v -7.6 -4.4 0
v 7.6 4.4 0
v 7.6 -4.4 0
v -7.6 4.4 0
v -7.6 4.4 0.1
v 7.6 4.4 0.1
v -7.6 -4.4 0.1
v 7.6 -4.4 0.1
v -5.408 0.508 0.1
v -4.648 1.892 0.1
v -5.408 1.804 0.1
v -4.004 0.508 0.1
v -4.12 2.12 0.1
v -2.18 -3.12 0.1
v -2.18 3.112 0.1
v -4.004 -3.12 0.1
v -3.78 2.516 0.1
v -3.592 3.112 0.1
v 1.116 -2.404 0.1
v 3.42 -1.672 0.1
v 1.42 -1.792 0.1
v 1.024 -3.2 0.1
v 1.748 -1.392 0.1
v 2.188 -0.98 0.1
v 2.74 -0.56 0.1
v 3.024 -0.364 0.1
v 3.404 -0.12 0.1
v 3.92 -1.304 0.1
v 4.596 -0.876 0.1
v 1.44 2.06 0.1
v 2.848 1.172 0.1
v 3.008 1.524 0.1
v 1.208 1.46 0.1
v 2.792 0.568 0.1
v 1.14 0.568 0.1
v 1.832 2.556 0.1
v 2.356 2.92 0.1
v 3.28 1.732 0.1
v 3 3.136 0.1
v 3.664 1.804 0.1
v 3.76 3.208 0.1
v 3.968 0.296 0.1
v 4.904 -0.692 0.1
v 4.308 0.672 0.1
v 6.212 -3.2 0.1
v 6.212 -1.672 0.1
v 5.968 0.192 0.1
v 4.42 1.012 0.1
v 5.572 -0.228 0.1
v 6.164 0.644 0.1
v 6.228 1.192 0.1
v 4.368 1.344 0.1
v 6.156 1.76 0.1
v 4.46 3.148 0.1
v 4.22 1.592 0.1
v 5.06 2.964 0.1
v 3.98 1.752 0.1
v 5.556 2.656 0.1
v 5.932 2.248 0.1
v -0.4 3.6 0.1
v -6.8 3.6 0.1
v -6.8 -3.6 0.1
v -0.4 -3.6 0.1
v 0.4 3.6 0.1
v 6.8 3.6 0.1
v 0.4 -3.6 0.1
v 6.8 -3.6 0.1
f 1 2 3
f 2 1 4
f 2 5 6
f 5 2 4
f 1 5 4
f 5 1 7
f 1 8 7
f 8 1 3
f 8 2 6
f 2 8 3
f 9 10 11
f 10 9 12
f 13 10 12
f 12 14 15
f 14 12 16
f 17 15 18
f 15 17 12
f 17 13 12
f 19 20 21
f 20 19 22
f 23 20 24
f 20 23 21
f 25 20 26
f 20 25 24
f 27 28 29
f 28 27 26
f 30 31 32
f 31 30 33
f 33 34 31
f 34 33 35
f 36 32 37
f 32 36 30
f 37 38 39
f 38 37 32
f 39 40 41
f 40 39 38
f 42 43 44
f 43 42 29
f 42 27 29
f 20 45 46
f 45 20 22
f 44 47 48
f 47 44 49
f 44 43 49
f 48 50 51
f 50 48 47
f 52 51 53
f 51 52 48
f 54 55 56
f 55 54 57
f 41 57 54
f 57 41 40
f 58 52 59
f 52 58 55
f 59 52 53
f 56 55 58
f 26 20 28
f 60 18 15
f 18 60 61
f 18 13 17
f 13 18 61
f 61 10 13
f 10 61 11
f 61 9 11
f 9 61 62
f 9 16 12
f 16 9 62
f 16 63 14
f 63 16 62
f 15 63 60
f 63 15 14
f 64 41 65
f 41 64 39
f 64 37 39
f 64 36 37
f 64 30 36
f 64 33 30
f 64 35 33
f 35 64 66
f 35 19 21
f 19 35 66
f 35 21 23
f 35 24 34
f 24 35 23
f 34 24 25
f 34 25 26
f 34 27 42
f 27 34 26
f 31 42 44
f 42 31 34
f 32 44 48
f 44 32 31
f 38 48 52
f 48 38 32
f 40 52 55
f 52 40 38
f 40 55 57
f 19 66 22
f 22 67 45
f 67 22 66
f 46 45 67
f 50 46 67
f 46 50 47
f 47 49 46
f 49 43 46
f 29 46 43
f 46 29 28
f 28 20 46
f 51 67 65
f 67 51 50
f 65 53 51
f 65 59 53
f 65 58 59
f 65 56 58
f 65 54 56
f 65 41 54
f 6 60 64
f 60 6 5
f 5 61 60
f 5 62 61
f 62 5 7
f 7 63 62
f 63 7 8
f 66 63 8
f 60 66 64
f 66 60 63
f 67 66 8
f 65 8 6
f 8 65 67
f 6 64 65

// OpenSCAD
// file: ../p/4-4edge.scad
use <../lib.scad>
$fa=1; $fs=0.2;
function ldraw_lib__4_4edge(realsolid=false) = [
// 0 Circle 1.0
// 0 Name: 4-4edge.dat
// 0 Author: James Jessiman
// 0 !LDRAW_ORG Primitive UPDATE 2017-01
// 0 !LICENSE Licensed under CC BY 2.0 and CC BY 4.0 : see CAreadme.txt
// 
// 0 BFC CERTIFY CCW
  [0,"BFC","CERTIFY"],
  [0,"BFC","CCW"],
// 
// 0 !HISTORY 1998-12-15 [PTadmin] Official Update 1998-10
// 0 !HISTORY 2005-12-28 [PTadmin] Official Update 2005-01
// 0 !HISTORY 2007-06-24 [PTadmin] Header formatted for Contributor Agreement
// 0 !HISTORY 2008-07-01 [PTadmin] Official Update 2008-01
// 0 !HISTORY 2017-01-15 [Steffen] BFCed
// 0 !HISTORY 2017-12-30 [PTadmin] Official Update 2017-01
// 
// 
// 2 24 1 0 0 0.9239 0 0.3827
  [2,24,1,0,0,0.9239,0,0.3827],
// 2 24 0.9239 0 0.3827 0.7071 0 0.7071
  [2,24,0.9239,0,0.3827,0.7071,0,0.7071],
// 2 24 0.7071 0 0.7071 0.3827 0 0.9239
  [2,24,0.7071,0,0.7071,0.3827,0,0.9239],
// 2 24 0.3827 0 0.9239 0 0 1
  [2,24,0.3827,0,0.9239,0,0,1],
// 2 24 0 0 1 -0.3827 0 0.9239
  [2,24,0,0,1,-0.3827,0,0.9239],
// 2 24 -0.3827 0 0.9239 -0.7071 0 0.7071
  [2,24,-0.3827,0,0.9239,-0.7071,0,0.7071],
// 2 24 -0.7071 0 0.7071 -0.9239 0 0.3827
  [2,24,-0.7071,0,0.7071,-0.9239,0,0.3827],
// 2 24 -0.9239 0 0.3827 -1 0 -0
  [2,24,-0.9239,0,0.3827,-1,0,-0],
// 2 24 -1 0 -0 -0.9239 0 -0.3827
  [2,24,-1,0,-0,-0.9239,0,-0.3827],
// 2 24 -0.9239 0 -0.3827 -0.7071 0 -0.7071
  [2,24,-0.9239,0,-0.3827,-0.7071,0,-0.7071],
// 2 24 -0.7071 0 -0.7071 -0.3827 0 -0.9239
  [2,24,-0.7071,0,-0.7071,-0.3827,0,-0.9239],
// 2 24 -0.3827 0 -0.9239 0 0 -1
  [2,24,-0.3827,0,-0.9239,0,0,-1],
// 2 24 0 0 -1 0.3827 0 -0.9239
  [2,24,0,0,-1,0.3827,0,-0.9239],
// 2 24 0.3827 0 -0.9239 0.7071 0 -0.7071
  [2,24,0.3827,0,-0.9239,0.7071,0,-0.7071],
// 2 24 0.7071 0 -0.7071 0.9239 0 -0.3827
  [2,24,0.7071,0,-0.7071,0.9239,0,-0.3827],
// 2 24 0.9239 0 -0.3827 1 0 0
  [2,24,0.9239,0,-0.3827,1,0,0],
];
module ldraw_lib__4_4edge(step=0, col=false, unit=2/5, alt=false, line=0.2, solid=!$preview)
    makepoly(ldraw_lib__4_4edge(solid), step=step, col=col, unit=unit, alt=alt, line=line, solid=solid);
ldraw_lib__4_4edge(line=0.2);
// file: ../p/4-4disc.scad
use <../lib.scad>
$fa=1; $fs=0.2;
function ldraw_lib__4_4disc(realsolid=false) = [
// 0 Disc 1.0
// 0 Name: 4-4disc.dat
// 0 Author: James Jessiman
// 0 !LDRAW_ORG Primitive UPDATE 2002-02
// 0 !LICENSE Licensed under CC BY 2.0 and CC BY 4.0 : see CAreadme.txt
// 
// 0 BFC CERTIFY CCW
  [0,"BFC","CERTIFY"],
  [0,"BFC","CCW"],
// 
// 0 !HISTORY 1998-12-15 [PTadmin] Official Update 1998-10
// 0 !HISTORY 2002-03-23 [sbliss] Added BFC statement
// 0 !HISTORY 2002-04-25 [PTadmin] Official Update 2002-02
// 0 !HISTORY 2007-06-24 [PTadmin] Header formatted for Contributor Agreement
// 0 !HISTORY 2008-07-01 [PTadmin] Official Update 2008-01
// 
// 
// 3 16 0 0 0 1 0 0 0.9239 0 0.3827
  [3,16,0,0,0,1,0,0,0.9239,0,0.3827],
// 3 16 0 0 0 0.9239 0 0.3827 0.7071 0 0.7071
  [3,16,0,0,0,0.9239,0,0.3827,0.7071,0,0.7071],
// 3 16 0 0 0 0.7071 0 0.7071 0.3827 0 0.9239
  [3,16,0,0,0,0.7071,0,0.7071,0.3827,0,0.9239],
// 3 16 0 0 0 0.3827 0 0.9239 0 0 1
  [3,16,0,0,0,0.3827,0,0.9239,0,0,1],
// 3 16 0 0 0 0 0 1 -0.3827 0 0.9239
  [3,16,0,0,0,0,0,1,-0.3827,0,0.9239],
// 3 16 0 0 0 -0.3827 0 0.9239 -0.7071 0 0.7071
  [3,16,0,0,0,-0.3827,0,0.9239,-0.7071,0,0.7071],
// 3 16 0 0 0 -0.7071 0 0.7071 -0.9239 0 0.3827
  [3,16,0,0,0,-0.7071,0,0.7071,-0.9239,0,0.3827],
// 3 16 0 0 0 -0.9239 0 0.3827 -1 0 -0
  [3,16,0,0,0,-0.9239,0,0.3827,-1,0,-0],
// 3 16 0 0 0 -1 0 -0 -0.9239 0 -0.3827
  [3,16,0,0,0,-1,0,-0,-0.9239,0,-0.3827],
// 3 16 0 0 0 -0.9239 0 -0.3827 -0.7071 0 -0.7071
  [3,16,0,0,0,-0.9239,0,-0.3827,-0.7071,0,-0.7071],
// 3 16 0 0 0 -0.7071 0 -0.7071 -0.3827 0 -0.9239
  [3,16,0,0,0,-0.7071,0,-0.7071,-0.3827,0,-0.9239],
// 3 16 0 0 0 -0.3827 0 -0.9239 0 0 -1
  [3,16,0,0,0,-0.3827,0,-0.9239,0,0,-1],
// 3 16 0 0 0 0 0 -1 0.3827 0 -0.9239
  [3,16,0,0,0,0,0,-1,0.3827,0,-0.9239],
// 3 16 0 0 0 0.3827 0 -0.9239 0.7071 0 -0.7071
  [3,16,0,0,0,0.3827,0,-0.9239,0.7071,0,-0.7071],
// 3 16 0 0 0 0.7071 0 -0.7071 0.9239 0 -0.3827
  [3,16,0,0,0,0.7071,0,-0.7071,0.9239,0,-0.3827],
// 3 16 0 0 0 0.9239 0 -0.3827 1 0 0
  [3,16,0,0,0,0.9239,0,-0.3827,1,0,0],
// 0
];
module ldraw_lib__4_4disc(step=0, col=false, unit=2/5, alt=false, line=0.2, solid=!$preview)
    makepoly(ldraw_lib__4_4disc(solid), step=step, col=col, unit=unit, alt=alt, line=line, solid=solid);
ldraw_lib__4_4disc(line=0.2);
// file: ../p/4-4cyli.scad
use <../lib.scad>
$fa=1; $fs=0.2;
function ldraw_lib__4_4cyli(realsolid=false) = [
// 0 Cylinder 1.0
// 0 Name: 4-4cyli.dat
// 0 Author: James Jessiman
// 0 !LDRAW_ORG Primitive UPDATE 2005-01
// 0 !LICENSE Licensed under CC BY 2.0 and CC BY 4.0 : see CAreadme.txt
// 
// 0 BFC CERTIFY CCW
  [0,"BFC","CERTIFY"],
  [0,"BFC","CCW"],
// 
// 0 !HISTORY 1998-12-15 [PTadmin] Official Update 1998-10
// 0 !HISTORY 2002-03-23 [sbliss] Added BFC statement; merged headers from files in distributions LDraw 0.27 and Complete.
// 0 !HISTORY 2002-04-25 [PTadmin] Official Update 2002-02
// 0 !HISTORY 2004-12-14 [guyvivan] BFC CCW
// 0 !HISTORY 2005-12-28 [PTadmin] Official Update 2005-01
// 0 !HISTORY 2007-06-24 [PTadmin] Header formatted for Contributor Agreement
// 0 !HISTORY 2008-07-01 [PTadmin] Official Update 2008-01
// 
// 
// 4 16 1 1 0 0.9239 1 0.3827 0.9239 0 0.3827 1 0 0
  [4,16,1,1,0,0.9239,1,0.3827,0.9239,0,0.3827,1,0,0],
// 5 24 1 0 0 1 1 0 0.9239 0 0.3827 0.9239 0 -0.3827
  [5,24,1,0,0,1,1,0,0.9239,0,0.3827,0.9239,0,-0.3827],
// 4 16 0.9239 1 0.3827 0.7071 1 0.7071 0.7071 0 0.7071 0.9239 0 0.3827
  [4,16,0.9239,1,0.3827,0.7071,1,0.7071,0.7071,0,0.7071,0.9239,0,0.3827],
// 5 24 0.9239 0 0.3827 0.9239 1 0.3827 0.7071 0 0.7071 1 0 0
  [5,24,0.9239,0,0.3827,0.9239,1,0.3827,0.7071,0,0.7071,1,0,0],
// 4 16 0.7071 1 0.7071 0.3827 1 0.9239 0.3827 0 0.9239 0.7071 0 0.7071
  [4,16,0.7071,1,0.7071,0.3827,1,0.9239,0.3827,0,0.9239,0.7071,0,0.7071],
// 5 24 0.7071 0 0.7071 0.7071 1 0.7071 0.3827 0 0.9239 0.9239 0 0.3827
  [5,24,0.7071,0,0.7071,0.7071,1,0.7071,0.3827,0,0.9239,0.9239,0,0.3827],
// 4 16 0.3827 1 0.9239 0 1 1 0 0 1 0.3827 0 0.9239
  [4,16,0.3827,1,0.9239,0,1,1,0,0,1,0.3827,0,0.9239],
// 5 24 0.3827 0 0.9239 0.3827 1 0.9239 0 0 1 0.7071 0 0.7071
  [5,24,0.3827,0,0.9239,0.3827,1,0.9239,0,0,1,0.7071,0,0.7071],
// 4 16 0 1 1 -0.3827 1 0.9239 -0.3827 0 0.9239 0 0 1
  [4,16,0,1,1,-0.3827,1,0.9239,-0.3827,0,0.9239,0,0,1],
// 5 24 0 0 1 0 1 1 -0.3827 0 0.9239 0.3827 0 0.9239
  [5,24,0,0,1,0,1,1,-0.3827,0,0.9239,0.3827,0,0.9239],
// 4 16 -0.3827 1 0.9239 -0.7071 1 0.7071 -0.7071 0 0.7071 -0.3827 0 0.9239
  [4,16,-0.3827,1,0.9239,-0.7071,1,0.7071,-0.7071,0,0.7071,-0.3827,0,0.9239],
// 5 24 -0.3827 0 0.9239 -0.3827 1 0.9239 -0.7071 0 0.7071 0 0 1
  [5,24,-0.3827,0,0.9239,-0.3827,1,0.9239,-0.7071,0,0.7071,0,0,1],
// 4 16 -0.7071 1 0.7071 -0.9239 1 0.3827 -0.9239 0 0.3827 -0.7071 0 0.7071
  [4,16,-0.7071,1,0.7071,-0.9239,1,0.3827,-0.9239,0,0.3827,-0.7071,0,0.7071],
// 5 24 -0.7071 0 0.7071 -0.7071 1 0.7071 -0.9239 0 0.3827 -0.3827 0 0.9239
  [5,24,-0.7071,0,0.7071,-0.7071,1,0.7071,-0.9239,0,0.3827,-0.3827,0,0.9239],
// 4 16 -0.9239 1 0.3827 -1 1 0 -1 0 0 -0.9239 0 0.3827
  [4,16,-0.9239,1,0.3827,-1,1,0,-1,0,0,-0.9239,0,0.3827],
// 5 24 -0.9239 0 0.3827 -0.9239 1 0.3827 -1 0 0 -0.7071 0 0.7071
  [5,24,-0.9239,0,0.3827,-0.9239,1,0.3827,-1,0,0,-0.7071,0,0.7071],
// 4 16 -1 1 0 -0.9239 1 -0.3827 -0.9239 0 -0.3827 -1 0 0
  [4,16,-1,1,0,-0.9239,1,-0.3827,-0.9239,0,-0.3827,-1,0,0],
// 5 24 -1 0 0 -1 1 0 -0.9239 0 -0.3827 -0.9239 0 0.3827
  [5,24,-1,0,0,-1,1,0,-0.9239,0,-0.3827,-0.9239,0,0.3827],
// 4 16 -0.9239 1 -0.3827 -0.7071 1 -0.7071 -0.7071 0 -0.7071 -0.9239 0 -0.3827
  [4,16,-0.9239,1,-0.3827,-0.7071,1,-0.7071,-0.7071,0,-0.7071,-0.9239,0,-0.3827],
// 5 24 -0.9239 0 -0.3827 -0.9239 1 -0.3827 -0.7071 0 -0.7071 -1 0 0
  [5,24,-0.9239,0,-0.3827,-0.9239,1,-0.3827,-0.7071,0,-0.7071,-1,0,0],
// 4 16 -0.7071 1 -0.7071 -0.3827 1 -0.9239 -0.3827 0 -0.9239 -0.7071 0 -0.7071
  [4,16,-0.7071,1,-0.7071,-0.3827,1,-0.9239,-0.3827,0,-0.9239,-0.7071,0,-0.7071],
// 5 24 -0.7071 0 -0.7071 -0.7071 1 -0.7071 -0.3827 0 -0.9239 -0.9239 0 -0.3827
  [5,24,-0.7071,0,-0.7071,-0.7071,1,-0.7071,-0.3827,0,-0.9239,-0.9239,0,-0.3827],
// 4 16 -0.3827 1 -0.9239 0 1 -1 0 0 -1 -0.3827 0 -0.9239
  [4,16,-0.3827,1,-0.9239,0,1,-1,0,0,-1,-0.3827,0,-0.9239],
// 5 24 -0.3827 0 -0.9239 -0.3827 1 -0.9239 0 0 -1 -0.7071 0 -0.7071
  [5,24,-0.3827,0,-0.9239,-0.3827,1,-0.9239,0,0,-1,-0.7071,0,-0.7071],
// 4 16 0 1 -1 0.3827 1 -0.9239 0.3827 0 -0.9239 0 0 -1
  [4,16,0,1,-1,0.3827,1,-0.9239,0.3827,0,-0.9239,0,0,-1],
// 5 24 0 0 -1 0 1 -1 0.3827 0 -0.9239 -0.3827 0 -0.9239
  [5,24,0,0,-1,0,1,-1,0.3827,0,-0.9239,-0.3827,0,-0.9239],
// 4 16 0.3827 1 -0.9239 0.7071 1 -0.7071 0.7071 0 -0.7071 0.3827 0 -0.9239
  [4,16,0.3827,1,-0.9239,0.7071,1,-0.7071,0.7071,0,-0.7071,0.3827,0,-0.9239],
// 5 24 0.3827 0 -0.9239 0.3827 1 -0.9239 0.7071 0 -0.7071 0 0 -1
  [5,24,0.3827,0,-0.9239,0.3827,1,-0.9239,0.7071,0,-0.7071,0,0,-1],
// 4 16 0.7071 1 -0.7071 0.9239 1 -0.3827 0.9239 0 -0.3827 0.7071 0 -0.7071
  [4,16,0.7071,1,-0.7071,0.9239,1,-0.3827,0.9239,0,-0.3827,0.7071,0,-0.7071],
// 5 24 0.7071 0 -0.7071 0.7071 1 -0.7071 0.9239 0 -0.3827 0.3827 0 -0.9239
  [5,24,0.7071,0,-0.7071,0.7071,1,-0.7071,0.9239,0,-0.3827,0.3827,0,-0.9239],
// 4 16 0.9239 1 -0.3827 1 1 0 1 0 0 0.9239 0 -0.3827
  [4,16,0.9239,1,-0.3827,1,1,0,1,0,0,0.9239,0,-0.3827],
// 5 24 0.9239 0 -0.3827 0.9239 1 -0.3827 1 0 0 0.7071 0 -0.7071
  [5,24,0.9239,0,-0.3827,0.9239,1,-0.3827,1,0,0,0.7071,0,-0.7071],
// 0
];
module ldraw_lib__4_4cyli(step=0, col=false, unit=2/5, alt=false, line=0.2, solid=!$preview)
    makepoly(ldraw_lib__4_4cyli(solid), step=step, col=col, unit=unit, alt=alt, line=line, solid=solid);
ldraw_lib__4_4cyli(line=0.2);
// file: ../p/stud3.scad
use <../lib.scad>
use <4-4cyli.scad>
use <4-4disc.scad>
use <4-4edge.scad>
$fa=1; $fs=0.2;
function ldraw_lib__stud3(realsolid=false) = realsolid ? 
    [openscad(translate([0,0,-eps()], o=cylinder(4+eps(), r=4)),2)] : [
// 0 Stud Tube Solid
// 0 Name: stud3.dat
// 0 Author: James Jessiman
// 0 !LDRAW_ORG Primitive UPDATE 2012-01
// 0 !LICENSE Licensed under CC BY 2.0 and CC BY 4.0 : see CAreadme.txt
// 
// 0 BFC CERTIFY CCW
  [0,"BFC","CERTIFY"],
  [0,"BFC","CCW"],
// 
// 0 !HISTORY 2002-04-04 [sbliss] Modified for BFC compliance
// 0 !HISTORY 2002-04-25 [PTadmin] Official Update 2002-02
// 0 !HISTORY 2007-06-24 [PTadmin] Header formatted for Contributor Agreement
// 0 !HISTORY 2008-07-01 [PTadmin] Official Update 2008-01
// 0 !HISTORY 2012-02-16 [Philo] Changed to CCW
// 0 !HISTORY 2012-03-30 [PTadmin] Official Update 2012-01
// 
// 
// 1 16 0 -4 0 4 0 0 0 1 0 0 0 4 4-4edge.dat
  [1,16,0,-4,0,4,0,0,0,1,0,0,0,4, ldraw_lib__4_4edge(realsolid)],
// 1 16 0 0 0 4 0 0 0 1 0 0 0 4 4-4edge.dat
  [1,16,0,0,0,4,0,0,0,1,0,0,0,4, ldraw_lib__4_4edge(realsolid)],
// 1 16 0 -4 0 4 0 0 0 1 0 0 0 4 4-4disc.dat
  [1,16,0,-4,0,4,0,0,0,1,0,0,0,4, ldraw_lib__4_4disc(realsolid)],
// 1 16 0 -4 0 4 0 0 0 4 0 0 0 4 4-4cyli.dat
  [1,16,0,-4,0,4,0,0,0,4,0,0,0,4, ldraw_lib__4_4cyli(realsolid)],
];
module ldraw_lib__stud3(step=0, col=false, unit=2/5, alt=false, line=0.2, solid=!$preview)
    makepoly(ldraw_lib__stud3(solid), step=step, col=col, unit=unit, alt=alt, line=line, solid=solid);
ldraw_lib__stud3(line=0.2);
// file: ../p/stud.scad
use <../lib.scad>
use <4-4cyli.scad>
use <4-4disc.scad>
use <4-4edge.scad>
$fa=1; $fs=0.2;
function ldraw_lib__stud(realsolid=false) = realsolid ? 
    [openscad(translate([0,0,-eps()], o=cylinder(4+eps(), r=6)),2)] : [
// 0 Stud
// 0 Name: stud.dat
// 0 Author: James Jessiman
// 0 !LDRAW_ORG Primitive UPDATE 2012-01
// 0 !LICENSE Licensed under CC BY 2.0 and CC BY 4.0 : see CAreadme.txt
// 
// 0 BFC CERTIFY CCW
  [0,"BFC","CERTIFY"],
  [0,"BFC","CCW"],
// 
// 0 !HISTORY 2002-04-04 [sbliss] Modified for BFC compliance
// 0 !HISTORY 2002-04-25 [PTadmin] Official Update 2002-02
// 0 !HISTORY 2007-06-24 [PTadmin] Header formatted for Contributor Agreement
// 0 !HISTORY 2008-07-01 [PTadmin] Official Update 2008-01
// 0 !HISTORY 2012-02-16 [Philo] Changed to CCW
// 0 !HISTORY 2012-03-30 [PTadmin] Official Update 2012-01
// 
// 
// 1 16 0 0 0 6 0 0 0 1 0 0 0 6 4-4edge.dat
  [1,16,0,0,0,6,0,0,0,1,0,0,0,6, ldraw_lib__4_4edge(realsolid)],
// 1 16 0 -4 0 6 0 0 0 1 0 0 0 6 4-4edge.dat
  [1,16,0,-4,0,6,0,0,0,1,0,0,0,6, ldraw_lib__4_4edge(realsolid)],
// 1 16 0 0 0 6 0 0 0 -4 0 0 0 6 4-4cyli.dat
  [1,16,0,0,0,6,0,0,0,-4,0,0,0,6, ldraw_lib__4_4cyli(realsolid)],
// 1 16 0 -4 0 6 0 0 0 1 0 0 0 6 4-4disc.dat
  [1,16,0,-4,0,6,0,0,0,1,0,0,0,6, ldraw_lib__4_4disc(realsolid)],
];
module ldraw_lib__stud(step=0, col=false, unit=2/5, alt=false, line=0.2, solid=!$preview)
    makepoly(ldraw_lib__stud(solid), step=step, col=col, unit=unit, alt=alt, line=line, solid=solid);
ldraw_lib__stud(line=0.2);
// file: ../p/box5.scad
use <../lib.scad>
$fa=1; $fs=0.2;
function ldraw_lib__box5(realsolid=false) = [
// 0 Box with 5 Faces and All Edges
// 0 Name: box5.dat
// 0 Author: James Jessiman
// 0 !LDRAW_ORG Primitive UPDATE 2012-01
// 0 !LICENSE Licensed under CC BY 2.0 and CC BY 4.0 : see CAreadme.txt
// 
// 0 BFC CERTIFY CCW
  [0,"BFC","CERTIFY"],
  [0,"BFC","CCW"],
// 
// 0 !HISTORY 2002-04-03 [sbliss] Modified for BFC compliance
// 0 !HISTORY 2002-04-25 [PTadmin] Official Update 2002-02
// 0 !HISTORY 2007-06-24 [PTadmin] Header formatted for Contributor Agreement
// 0 !HISTORY 2008-07-01 [PTadmin] Official Update 2008-01
// 0 !HISTORY 2012-02-16 [Philo] Changed to CCW
// 0 !HISTORY 2012-03-30 [PTadmin] Official Update 2012-01
// 
// 
// 2 24 1 1 1 -1 1 1
  [2,24,1,1,1,-1,1,1],
// 2 24 -1 1 1 -1 1 -1
  [2,24,-1,1,1,-1,1,-1],
// 2 24 -1 1 -1 1 1 -1
  [2,24,-1,1,-1,1,1,-1],
// 2 24 1 1 -1 1 1 1
  [2,24,1,1,-1,1,1,1],
// 2 24 1 0 1 -1 0 1
  [2,24,1,0,1,-1,0,1],
// 2 24 -1 0 1 -1 0 -1
  [2,24,-1,0,1,-1,0,-1],
// 2 24 -1 0 -1 1 0 -1
  [2,24,-1,0,-1,1,0,-1],
// 2 24 1 0 -1 1 0 1
  [2,24,1,0,-1,1,0,1],
// 2 24 1 0 1 1 1 1
  [2,24,1,0,1,1,1,1],
// 2 24 -1 0 1 -1 1 1
  [2,24,-1,0,1,-1,1,1],
// 2 24 1 0 -1 1 1 -1
  [2,24,1,0,-1,1,1,-1],
// 2 24 -1 0 -1 -1 1 -1
  [2,24,-1,0,-1,-1,1,-1],
// 4 16 -1 1 1 1 1 1 1 1 -1 -1 1 -1
  [4,16,-1,1,1,1,1,1,1,1,-1,-1,1,-1],
// 4 16 -1 1 1 -1 0 1 1 0 1 1 1 1
  [4,16,-1,1,1,-1,0,1,1,0,1,1,1,1],
// 4 16 -1 1 -1 -1 0 -1 -1 0 1 -1 1 1
  [4,16,-1,1,-1,-1,0,-1,-1,0,1,-1,1,1],
// 4 16 1 1 -1 1 0 -1 -1 0 -1 -1 1 -1
  [4,16,1,1,-1,1,0,-1,-1,0,-1,-1,1,-1],
// 4 16 1 1 1 1 0 1 1 0 -1 1 1 -1
  [4,16,1,1,1,1,0,1,1,0,-1,1,1,-1],
];
module ldraw_lib__box5(step=0, col=false, unit=2/5, alt=false, line=0.2, solid=!$preview)
    makepoly(ldraw_lib__box5(solid), step=step, col=col, unit=unit, alt=alt, line=line, solid=solid);
ldraw_lib__box5(line=0.2);
// file: ../p/box4t.scad
use <../lib.scad>
$fa=1; $fs=0.2;
function ldraw_lib__box4t(realsolid=false) = [
// 0 Box with 4 Adjacent Faces and All Edges
// 0 Name: box4t.dat
// 0 Author: Tore Eriksson [Tore_Eriksson]
// 0 !LDRAW_ORG Primitive UPDATE 2003-02
// 0 !LICENSE Licensed under CC BY 2.0 and CC BY 4.0 : see CAreadme.txt
// 
// 0 BFC CERTIFY CCW
  [0,"BFC","CERTIFY"],
  [0,"BFC","CCW"],
// 
// 0 !HISTORY 1997-09-29 [PTadmin] Official Update 1997-15
// 0 !HISTORY 2002-08-31 [izanette] Modified with WINDZ for BFC compliance
// 0 !HISTORY 2003-08-01 [PTadmin] Official Update 2003-02
// 0 !HISTORY 2007-06-24 [PTadmin] Header formatted for Contributor Agreement
// 0 !HISTORY 2008-07-01 [PTadmin] Official Update 2008-01
// 
// 
// 2 24 1 1 1 -1 1 1
  [2,24,1,1,1,-1,1,1],
// 2 24 -1 1 1 -1 1 -1
  [2,24,-1,1,1,-1,1,-1],
// 2 24 -1 1 -1 1 1 -1
  [2,24,-1,1,-1,1,1,-1],
// 2 24 1 1 -1 1 1 1
  [2,24,1,1,-1,1,1,1],
// 2 24 1 0 1 -1 0 1
  [2,24,1,0,1,-1,0,1],
// 2 24 -1 0 1 -1 0 -1
  [2,24,-1,0,1,-1,0,-1],
// 2 24 -1 0 -1 1 0 -1
  [2,24,-1,0,-1,1,0,-1],
// 2 24 1 0 -1 1 0 1
  [2,24,1,0,-1,1,0,1],
// 2 24 1 0 1 1 1 1
  [2,24,1,0,1,1,1,1],
// 2 24 -1 0 1 -1 1 1
  [2,24,-1,0,1,-1,1,1],
// 2 24 1 0 -1 1 1 -1
  [2,24,1,0,-1,1,1,-1],
// 2 24 -1 0 -1 -1 1 -1
  [2,24,-1,0,-1,-1,1,-1],
// 4 16 1 1 1 1 1 -1 -1 1 -1 -1 1 1
  [4,16,1,1,1,1,1,-1,-1,1,-1,-1,1,1],
// 4 16 1 1 1 -1 1 1 -1 0 1 1 0 1
  [4,16,1,1,1,-1,1,1,-1,0,1,1,0,1],
// 4 16 -1 1 1 -1 1 -1 -1 0 -1 -1 0 1
  [4,16,-1,1,1,-1,1,-1,-1,0,-1,-1,0,1],
// 0 4 16 -1 1 -1 -1 0 -1 1 0 -1 1 1 -1
// 4 16 1 1 -1 1 1 1 1 0 1 1 0 -1
  [4,16,1,1,-1,1,1,1,1,0,1,1,0,-1],
// 0
];
module ldraw_lib__box4t(step=0, col=false, unit=2/5, alt=false, line=0.2, solid=!$preview)
    makepoly(ldraw_lib__box4t(solid), step=step, col=col, unit=unit, alt=alt, line=line, solid=solid);
ldraw_lib__box4t(line=0.2);
// file: s/3004s01.scad
use <../../lib.scad>
use <../../p/box4t.scad>
use <../../p/box5.scad>
use <../../p/stud.scad>
use <../../p/stud3.scad>
$fa=1; $fs=0.2;
function ldraw_lib__s__3004s01(realsolid=false) = [
// 0 ~Brick  1 x  2 without Front Face
// 0 Name: s\3004s01.dat
// 0 Author: James Jessiman
// 0 !LDRAW_ORG Subpart UPDATE 2003-03
// 0 !LICENSE Licensed under CC BY 2.0 and CC BY 4.0 : see CAreadme.txt
// 
// 0 BFC CERTIFY CCW
  [0,"BFC","CERTIFY"],
  [0,"BFC","CCW"],
// 
// 0 !HISTORY 2003-09-07 [jriley] Subfiling, BFC
// 0 !HISTORY 2003-12-19 [PTadmin] Official Update 2003-03
// 0 !HISTORY 2007-08-29 [PTadmin] Header formatted for Contributor Agreement
// 0 !HISTORY 2008-07-01 [PTadmin] Official Update 2008-01
// 
// 
// 1 16 0 4 0 1 0 0 0 -5 0 0 0 1 stud3.dat
  [1,16,0,4,0,1,0,0,0,-5,0,0,0,1, ldraw_lib__stud3(realsolid)],
// 0 BFC INVERTNEXT
  [0,"BFC","INVERTNEXT"],
// 1 16 0 24 0 16 0 0 0 -20 0 0 0 6 box5.dat
  [1,16,0,24,0,16,0,0,0,-20,0,0,0,6, ldraw_lib__box5(realsolid)],
// 4 16 20 24 10 16 24 6 -16 24 6 -20 24 10
  [4,16,20,24,10,16,24,6,-16,24,6,-20,24,10],
// 4 16 -20 24 10 -16 24 6 -16 24 -6 -20 24 -10
  [4,16,-20,24,10,-16,24,6,-16,24,-6,-20,24,-10],
// 4 16 -20 24 -10 -16 24 -6 16 24 -6 20 24 -10
  [4,16,-20,24,-10,-16,24,-6,16,24,-6,20,24,-10],
// 4 16 20 24 -10 16 24 -6 16 24 6 20 24 10
  [4,16,20,24,-10,16,24,-6,16,24,6,20,24,10],
// 1 16 0 24 0 20 0 0 0 -24 0 0 0 10 box4t.dat
  [1,16,0,24,0,20,0,0,0,-24,0,0,0,10, ldraw_lib__box4t(realsolid)],
// 1 16 10 0 0 1 0 0 0 1 0 0 0 1 stud.dat
  [1,16,10,0,0,1,0,0,0,1,0,0,0,1, ldraw_lib__stud(realsolid)],
// 1 16 -10 0 0 1 0 0 0 1 0 0 0 1 stud.dat
  [1,16,-10,0,0,1,0,0,0,1,0,0,0,1, ldraw_lib__stud(realsolid)],
// 0
];
module ldraw_lib__s__3004s01(step=0, col=false, unit=2/5, alt=false, line=0.2, solid=!$preview)
    makepoly(ldraw_lib__s__3004s01(solid), step=step, col=col, unit=unit, alt=alt, line=line, solid=solid);
ldraw_lib__s__3004s01(line=0.2);
// file: 3004.scad
use <../lib.scad>
use <s/3004s01.scad>
$fa=1; $fs=0.2;
function ldraw_lib__3004(realsolid=false) = [
// 0 Brick  1 x  2
// 0 Name: 3004.dat
// 0 Author: James Jessiman
// 0 !LDRAW_ORG Part UPDATE 2022-05
// 0 !LICENSE Licensed under CC BY 2.0 and CC BY 4.0 : see CAreadme.txt
// 
// 0 BFC CERTIFY CCW
  [0,"BFC","CERTIFY"],
  [0,"BFC","CCW"],
// 
// 0 !HISTORY 2001-10-26 [PTadmin] Official Update 2001-01
// 0 !HISTORY 2002-05-07 {unknown} BFC Certification
// 0 !HISTORY 2002-06-11 [PTadmin] Official Update 2002-03
// 0 !HISTORY 2007-05-07 [PTadmin] Header formatted for Contributor Agreement
// 0 !HISTORY 2008-07-01 [PTadmin] Official Update 2008-01
// 0 !HISTORY 2022-08-04 [MagFors] Using subfile
// 0 !HISTORY 2022-09-15 [PTadmin] Official Update 2022-05
// 
// 
// 1 16 0 0 0 1 0 0 0 1 0 0 0 1 s\3004s01.dat
  [1,16,0,0,0,1,0,0,0,1,0,0,0,1, ldraw_lib__s__3004s01(realsolid)],
// 4 16 -20 24 -10 20 24 -10 20 0 -10 -20 0 -10
  [4,16,-20,24,-10,20,24,-10,20,0,-10,-20,0,-10],
];
module ldraw_lib__3004(step=0, col=false, unit=2/5, alt=false, line=0.2, solid=!$preview)
    makepoly(ldraw_lib__3004(solid), step=step, col=col, unit=unit, alt=alt, line=line, solid=solid);
ldraw_lib__3004(line=0.2);
// file: ../p/box5-12.scad
use <../lib.scad>
$fa=1; $fs=0.2;
function ldraw_lib__box5_12(realsolid=false) = [
// 0 Box with 5 Faces without Any Edges
// 0 Name: box5-12.dat
// 0 Author: Chris Dee [cwdee]
// 0 !LDRAW_ORG Primitive UPDATE 2009-02
// 0 !LICENSE Licensed under CC BY 2.0 and CC BY 4.0 : see CAreadme.txt
// 
// 0 BFC CERTIFY CCW
  [0,"BFC","CERTIFY"],
  [0,"BFC","CCW"],
// 
// 0 !HISTORY 2009-09-03 [PTadmin] Official Update 2009-02
// 
// 
// 4 16 1 1 1 1 1 -1 -1 1 -1 -1 1 1
  [4,16,1,1,1,1,1,-1,-1,1,-1,-1,1,1],
// 4 16 -1 0 1 1 0 1 1 1 1 -1 1 1
  [4,16,-1,0,1,1,0,1,1,1,1,-1,1,1],
// 4 16 -1 0 -1 -1 0 1 -1 1 1 -1 1 -1
  [4,16,-1,0,-1,-1,0,1,-1,1,1,-1,1,-1],
// 4 16 1 0 -1 -1 0 -1 -1 1 -1 1 1 -1
  [4,16,1,0,-1,-1,0,-1,-1,1,-1,1,1,-1],
// 4 16 1 0 1 1 0 -1 1 1 -1 1 1 1
  [4,16,1,0,1,1,0,-1,1,1,-1,1,1,1],
// 0
];
module ldraw_lib__box5_12(step=0, col=false, unit=2/5, alt=false, line=0.2, solid=!$preview)
    makepoly(ldraw_lib__box5_12(solid), step=step, col=col, unit=unit, alt=alt, line=line, solid=solid);
ldraw_lib__box5_12(line=0.2);
// main file
use <../lib.scad>
use <../p/box5-12.scad>
$fa=1; $fs=0.2;
function ldraw_lib__190155c(realsolid=false) = [
// 0 Sticker  1.1 x  1.9 with White "1" and "2" in Black Squares
// 0 Name: 190155c.dat
// 0 Author: Takeshi Takahashi [RainbowDolphin]
// 0 !LDRAW_ORG Part UPDATE 2022-05
// 0 !LICENSE Licensed under CC BY 2.0 and CC BY 4.0 : see CAreadme.txt
// 
// 0 BFC CERTIFY CCW
  [0,"BFC","CERTIFY"],
  [0,"BFC","CCW"],
// 
// 0 !KEYWORDS Service station, Set 6378
// 
// 0 !HISTORY 2022-09-15 [PTadmin] Official Update 2022-05
// 
// 
// 1 16 0 -0.25 0 19 0 0 0 0.25 0 0 0 11 box5-12.dat
  [1,16,0,-0.25,0,19,0,0,0,0.25,0,0,0,11, ldraw_lib__box5_12(realsolid)],
// 4 15 -13.52 -0.25 1.27 -10.01 -0.25 1.27 -11.62 -0.25 4.73 -13.52 -0.25 4.51
  [4,15,-13.52,-0.25,1.27,-10.01,-0.25,1.27,-11.62,-0.25,4.73,-13.52,-0.25,4.51],
// 3 15 -10.3 -0.25 5.3 -11.62 -0.25 4.73 -10.01 -0.25 1.27
  [3,15,-10.3,-0.25,5.3,-11.62,-0.25,4.73,-10.01,-0.25,1.27],
// 4 15 -5.45 -0.25 -7.8 -5.45 -0.25 7.78 -10.01 -0.25 1.27 -10.01 -0.25 -7.8
  [4,15,-5.45,-0.25,-7.8,-5.45,-0.25,7.78,-10.01,-0.25,1.27,-10.01,-0.25,-7.8],
// 4 15 -5.45 -0.25 7.78 -8.98 -0.25 7.78 -9.45 -0.25 6.29 -10.01 -0.25 1.27
  [4,15,-5.45,-0.25,7.78,-8.98,-0.25,7.78,-9.45,-0.25,6.29,-10.01,-0.25,1.27],
// 3 15 -9.45 -0.25 6.29 -10.3 -0.25 5.3 -10.01 -0.25 1.27
  [3,15,-9.45,-0.25,6.29,-10.3,-0.25,5.3,-10.01,-0.25,1.27],
// 4 15 2.79 -0.25 -6.01 2.56 -0.25 -8 8.55 -0.25 -4.18 3.55 -0.25 -4.48
  [4,15,2.79,-0.25,-6.01,2.56,-0.25,-8,8.55,-0.25,-4.18,3.55,-0.25,-4.48],
// 4 15 4.37 -0.25 -3.48 3.55 -0.25 -4.48 8.55 -0.25 -4.18 5.47 -0.25 -2.45
  [4,15,4.37,-0.25,-3.48,3.55,-0.25,-4.48,8.55,-0.25,-4.18,5.47,-0.25,-2.45],
// 4 15 6.85 -0.25 -1.4 5.47 -0.25 -2.45 8.55 -0.25 -4.18 7.56 -0.25 -0.91
  [4,15,6.85,-0.25,-1.4,5.47,-0.25,-2.45,8.55,-0.25,-4.18,7.56,-0.25,-0.91],
// 4 15 8.51 -0.25 -0.3 7.56 -0.25 -0.91 9.8 -0.25 -3.26 11.49 -0.25 -2.19
  [4,15,8.51,-0.25,-0.3,7.56,-0.25,-0.91,9.8,-0.25,-3.26,11.49,-0.25,-2.19],
// 4 15 3.6 -0.25 5.15 3.02 -0.25 3.65 7.12 -0.25 2.93 7.52 -0.25 3.81
  [4,15,3.6,-0.25,5.15,3.02,-0.25,3.65,7.12,-0.25,2.93,7.52,-0.25,3.81],
// 4 15 3.02 -0.25 3.65 2.85 -0.25 1.42 6.98 -0.25 1.42 7.12 -0.25 2.93
  [4,15,3.02,-0.25,3.65,2.85,-0.25,1.42,6.98,-0.25,1.42,7.12,-0.25,2.93],
// 4 15 4.58 -0.25 6.39 3.6 -0.25 5.15 7.52 -0.25 3.81 5.89 -0.25 7.3
  [4,15,4.58,-0.25,6.39,3.6,-0.25,5.15,7.52,-0.25,3.81,5.89,-0.25,7.3],
// 4 15 8.2 -0.25 4.33 7.5 -0.25 7.84 5.89 -0.25 7.3 7.52 -0.25 3.81
  [4,15,8.2,-0.25,4.33,7.5,-0.25,7.84,5.89,-0.25,7.3,7.52,-0.25,3.81],
// 4 15 7.5 -0.25 7.84 8.2 -0.25 4.33 9.16 -0.25 4.51 9.4 -0.25 8.02
  [4,15,7.5,-0.25,7.84,8.2,-0.25,4.33,9.16,-0.25,4.51,9.4,-0.25,8.02],
// 4 15 12.26 -0.25 -1.73 10.77 -0.25 1.68 9.92 -0.25 0.74 11.49 -0.25 -2.19
  [4,15,12.26,-0.25,-1.73,10.77,-0.25,1.68,9.92,-0.25,0.74,11.49,-0.25,-2.19],
// 3 15 9.92 -0.25 0.74 8.51 -0.25 -0.3 11.49 -0.25 -2.19
  [3,15,9.92,-0.25,0.74,8.51,-0.25,-0.3,11.49,-0.25,-2.19],
// 4 15 15.53 -0.25 -8 15.53 -0.25 -4.18 8.55 -0.25 -4.18 2.56 -0.25 -8
  [4,15,15.53,-0.25,-8,15.53,-0.25,-4.18,8.55,-0.25,-4.18,2.56,-0.25,-8],
// 4 15 14.92 -0.25 0.48 11.05 -0.25 2.53 10.77 -0.25 1.68 13.93 -0.25 -0.57
  [4,15,14.92,-0.25,0.48,11.05,-0.25,2.53,10.77,-0.25,1.68,13.93,-0.25,-0.57],
// 3 15 10.77 -0.25 1.68 12.26 -0.25 -1.73 13.93 -0.25 -0.57
  [3,15,10.77,-0.25,1.68,12.26,-0.25,-1.73,13.93,-0.25,-0.57],
// 4 15 11.05 -0.25 2.53 14.92 -0.25 0.48 15.41 -0.25 1.61 15.57 -0.25 2.98
  [4,15,11.05,-0.25,2.53,14.92,-0.25,0.48,15.41,-0.25,1.61,15.57,-0.25,2.98],
// 4 15 10.92 -0.25 3.36 11.05 -0.25 2.53 15.57 -0.25 2.98 15.39 -0.25 4.4
  [4,15,10.92,-0.25,3.36,11.05,-0.25,2.53,15.57,-0.25,2.98,15.39,-0.25,4.4],
// 4 15 9.95 -0.25 4.38 10.55 -0.25 3.98 12.65 -0.25 7.41 11.15 -0.25 7.87
  [4,15,9.95,-0.25,4.38,10.55,-0.25,3.98,12.65,-0.25,7.41,11.15,-0.25,7.87],
// 4 15 9.4 -0.25 8.02 9.16 -0.25 4.51 9.95 -0.25 4.38 11.15 -0.25 7.87
  [4,15,9.4,-0.25,8.02,9.16,-0.25,4.51,9.95,-0.25,4.38,11.15,-0.25,7.87],
// 4 15 13.89 -0.25 6.64 10.55 -0.25 3.98 10.92 -0.25 3.36 14.83 -0.25 5.62
  [4,15,13.89,-0.25,6.64,10.55,-0.25,3.98,10.92,-0.25,3.36,14.83,-0.25,5.62],
// 3 15 14.83 -0.25 5.62 10.92 -0.25 3.36 15.39 -0.25 4.4
  [3,15,14.83,-0.25,5.62,10.92,-0.25,3.36,15.39,-0.25,4.4],
// 3 15 12.65 -0.25 7.41 10.55 -0.25 3.98 13.89 -0.25 6.64
  [3,15,12.65,-0.25,7.41,10.55,-0.25,3.98,13.89,-0.25,6.64],
// 3 15 7.56 -0.25 -0.91 8.55 -0.25 -4.18 9.8 -0.25 -3.26
  [3,15,7.56,-0.25,-0.91,8.55,-0.25,-4.18,9.8,-0.25,-3.26],
// 4 0 -1 -0.25 9 -17 -0.25 9 -8.98 -0.25 7.78 -5.45 -0.25 7.78
  [4,0,-1,-0.25,9,-17,-0.25,9,-8.98,-0.25,7.78,-5.45,-0.25,7.78],
// 4 0 -9.45 -0.25 6.29 -8.98 -0.25 7.78 -17 -0.25 9 -10.3 -0.25 5.3
  [4,0,-9.45,-0.25,6.29,-8.98,-0.25,7.78,-17,-0.25,9,-10.3,-0.25,5.3],
// 4 0 -11.62 -0.25 4.73 -10.3 -0.25 5.3 -17 -0.25 9 -13.52 -0.25 4.51
  [4,0,-11.62,-0.25,4.73,-10.3,-0.25,5.3,-17,-0.25,9,-13.52,-0.25,4.51],
// 4 0 -13.52 -0.25 1.27 -13.52 -0.25 4.51 -17 -0.25 9 -17 -0.25 -9
  [4,0,-13.52,-0.25,1.27,-13.52,-0.25,4.51,-17,-0.25,9,-17,-0.25,-9],
// 4 0 -10.01 -0.25 1.27 -13.52 -0.25 1.27 -17 -0.25 -9 -10.01 -0.25 -7.8
  [4,0,-10.01,-0.25,1.27,-13.52,-0.25,1.27,-17,-0.25,-9,-10.01,-0.25,-7.8],
// 4 0 -10.01 -0.25 -7.8 -17 -0.25 -9 -1 -0.25 -9 -5.45 -0.25 -7.8
  [4,0,-10.01,-0.25,-7.8,-17,-0.25,-9,-1,-0.25,-9,-5.45,-0.25,-7.8],
// 4 0 -5.45 -0.25 7.78 -5.45 -0.25 -7.8 -1 -0.25 -9 -1 -0.25 9
  [4,0,-5.45,-0.25,7.78,-5.45,-0.25,-7.8,-1,-0.25,-9,-1,-0.25,9],
// 4 0 9.4 -0.25 8.02 17 -0.25 9 1 -0.25 9 7.5 -0.25 7.84
  [4,0,9.4,-0.25,8.02,17,-0.25,9,1,-0.25,9,7.5,-0.25,7.84],
// 3 0 1 -0.25 9 5.89 -0.25 7.3 7.5 -0.25 7.84
  [3,0,1,-0.25,9,5.89,-0.25,7.3,7.5,-0.25,7.84],
// 3 0 1 -0.25 9 4.58 -0.25 6.39 5.89 -0.25 7.3
  [3,0,1,-0.25,9,4.58,-0.25,6.39,5.89,-0.25,7.3],
// 3 0 1 -0.25 9 3.6 -0.25 5.15 4.58 -0.25 6.39
  [3,0,1,-0.25,9,3.6,-0.25,5.15,4.58,-0.25,6.39],
// 3 0 1 -0.25 9 3.02 -0.25 3.65 3.6 -0.25 5.15
  [3,0,1,-0.25,9,3.02,-0.25,3.65,3.6,-0.25,5.15],
// 4 0 2.85 -0.25 1.42 3.02 -0.25 3.65 1 -0.25 9 1 -0.25 -9
  [4,0,2.85,-0.25,1.42,3.02,-0.25,3.65,1,-0.25,9,1,-0.25,-9],
// 4 0 2.85 -0.25 1.42 1 -0.25 -9 2.79 -0.25 -6.01 3.55 -0.25 -4.48
  [4,0,2.85,-0.25,1.42,1,-0.25,-9,2.79,-0.25,-6.01,3.55,-0.25,-4.48],
// 3 0 2.85 -0.25 1.42 3.55 -0.25 -4.48 4.37 -0.25 -3.48
  [3,0,2.85,-0.25,1.42,3.55,-0.25,-4.48,4.37,-0.25,-3.48],
// 4 0 2.85 -0.25 1.42 4.37 -0.25 -3.48 5.47 -0.25 -2.45 6.98 -0.25 1.42
  [4,0,2.85,-0.25,1.42,4.37,-0.25,-3.48,5.47,-0.25,-2.45,6.98,-0.25,1.42],
// 3 0 6.98 -0.25 1.42 5.47 -0.25 -2.45 6.85 -0.25 -1.4
  [3,0,6.98,-0.25,1.42,5.47,-0.25,-2.45,6.85,-0.25,-1.4],
// 3 0 6.98 -0.25 1.42 6.85 -0.25 -1.4 7.56 -0.25 -0.91
  [3,0,6.98,-0.25,1.42,6.85,-0.25,-1.4,7.56,-0.25,-0.91],
// 4 0 6.98 -0.25 1.42 7.56 -0.25 -0.91 8.51 -0.25 -0.3 9.92 -0.25 0.74
  [4,0,6.98,-0.25,1.42,7.56,-0.25,-0.91,8.51,-0.25,-0.3,9.92,-0.25,0.74],
// 4 0 7.12 -0.25 2.93 6.98 -0.25 1.42 9.92 -0.25 0.74 10.77 -0.25 1.68
  [4,0,7.12,-0.25,2.93,6.98,-0.25,1.42,9.92,-0.25,0.74,10.77,-0.25,1.68],
// 4 0 7.52 -0.25 3.81 7.12 -0.25 2.93 10.77 -0.25 1.68 11.05 -0.25 2.53
  [4,0,7.52,-0.25,3.81,7.12,-0.25,2.93,10.77,-0.25,1.68,11.05,-0.25,2.53],
// 4 0 8.2 -0.25 4.33 7.52 -0.25 3.81 11.05 -0.25 2.53 10.92 -0.25 3.36
  [4,0,8.2,-0.25,4.33,7.52,-0.25,3.81,11.05,-0.25,2.53,10.92,-0.25,3.36],
// 4 0 9.16 -0.25 4.51 8.2 -0.25 4.33 10.92 -0.25 3.36 10.55 -0.25 3.98
  [4,0,9.16,-0.25,4.51,8.2,-0.25,4.33,10.92,-0.25,3.36,10.55,-0.25,3.98],
// 3 0 9.16 -0.25 4.51 10.55 -0.25 3.98 9.95 -0.25 4.38
  [3,0,9.16,-0.25,4.51,10.55,-0.25,3.98,9.95,-0.25,4.38],
// 3 0 2.79 -0.25 -6.01 1 -0.25 -9 2.56 -0.25 -8
  [3,0,2.79,-0.25,-6.01,1,-0.25,-9,2.56,-0.25,-8],
// 4 0 15.53 -0.25 -8 2.56 -0.25 -8 1 -0.25 -9 17 -0.25 -9
  [4,0,15.53,-0.25,-8,2.56,-0.25,-8,1,-0.25,-9,17,-0.25,-9],
// 3 0 15.53 -0.25 -4.18 15.53 -0.25 -8 17 -0.25 -9
  [3,0,15.53,-0.25,-4.18,15.53,-0.25,-8,17,-0.25,-9],
// 4 0 15.53 -0.25 -4.18 17 -0.25 -9 15.41 -0.25 1.61 14.92 -0.25 0.48
  [4,0,15.53,-0.25,-4.18,17,-0.25,-9,15.41,-0.25,1.61,14.92,-0.25,0.48],
// 3 0 14.92 -0.25 0.48 13.93 -0.25 -0.57 15.53 -0.25 -4.18
  [3,0,14.92,-0.25,0.48,13.93,-0.25,-0.57,15.53,-0.25,-4.18],
// 3 0 13.93 -0.25 -0.57 12.26 -0.25 -1.73 15.53 -0.25 -4.18
  [3,0,13.93,-0.25,-0.57,12.26,-0.25,-1.73,15.53,-0.25,-4.18],
// 4 0 15.53 -0.25 -4.18 12.26 -0.25 -1.73 11.49 -0.25 -2.19 9.8 -0.25 -3.26
  [4,0,15.53,-0.25,-4.18,12.26,-0.25,-1.73,11.49,-0.25,-2.19,9.8,-0.25,-3.26],
// 3 0 9.8 -0.25 -3.26 8.55 -0.25 -4.18 15.53 -0.25 -4.18
  [3,0,9.8,-0.25,-3.26,8.55,-0.25,-4.18,15.53,-0.25,-4.18],
// 4 0 15.57 -0.25 2.98 15.41 -0.25 1.61 17 -0.25 -9 17 -0.25 9
  [4,0,15.57,-0.25,2.98,15.41,-0.25,1.61,17,-0.25,-9,17,-0.25,9],
// 3 0 17 -0.25 9 15.39 -0.25 4.4 15.57 -0.25 2.98
  [3,0,17,-0.25,9,15.39,-0.25,4.4,15.57,-0.25,2.98],
// 3 0 17 -0.25 9 14.83 -0.25 5.62 15.39 -0.25 4.4
  [3,0,17,-0.25,9,14.83,-0.25,5.62,15.39,-0.25,4.4],
// 3 0 17 -0.25 9 13.89 -0.25 6.64 14.83 -0.25 5.62
  [3,0,17,-0.25,9,13.89,-0.25,6.64,14.83,-0.25,5.62],
// 3 0 17 -0.25 9 12.65 -0.25 7.41 13.89 -0.25 6.64
  [3,0,17,-0.25,9,12.65,-0.25,7.41,13.89,-0.25,6.64],
// 3 0 17 -0.25 9 11.15 -0.25 7.87 12.65 -0.25 7.41
  [3,0,17,-0.25,9,11.15,-0.25,7.87,12.65,-0.25,7.41],
// 3 0 17 -0.25 9 9.4 -0.25 8.02 11.15 -0.25 7.87
  [3,0,17,-0.25,9,9.4,-0.25,8.02,11.15,-0.25,7.87],
// 4 15 1 -0.25 9 19 -0.25 11 -19 -0.25 11 -1 -0.25 9
  [4,15,1,-0.25,9,19,-0.25,11,-19,-0.25,11,-1,-0.25,9],
// 3 15 -19 -0.25 11 -17 -0.25 9 -1 -0.25 9
  [3,15,-19,-0.25,11,-17,-0.25,9,-1,-0.25,9],
// 4 15 -17 -0.25 -9 -17 -0.25 9 -19 -0.25 11 -19 -0.25 -11
  [4,15,-17,-0.25,-9,-17,-0.25,9,-19,-0.25,11,-19,-0.25,-11],
// 4 15 -1 -0.25 -9 -17 -0.25 -9 -19 -0.25 -11 19 -0.25 -11
  [4,15,-1,-0.25,-9,-17,-0.25,-9,-19,-0.25,-11,19,-0.25,-11],
// 3 15 1 -0.25 -9 -1 -0.25 -9 19 -0.25 -11
  [3,15,1,-0.25,-9,-1,-0.25,-9,19,-0.25,-11],
// 4 15 -1 -0.25 -9 1 -0.25 -9 1 -0.25 9 -1 -0.25 9
  [4,15,-1,-0.25,-9,1,-0.25,-9,1,-0.25,9,-1,-0.25,9],
// 3 15 17 -0.25 -9 1 -0.25 -9 19 -0.25 -11
  [3,15,17,-0.25,-9,1,-0.25,-9,19,-0.25,-11],
// 4 15 17 -0.25 9 17 -0.25 -9 19 -0.25 -11 19 -0.25 11
  [4,15,17,-0.25,9,17,-0.25,-9,19,-0.25,-11,19,-0.25,11],
// 3 15 19 -0.25 11 1 -0.25 9 17 -0.25 9
  [3,15,19,-0.25,11,1,-0.25,9,17,-0.25,9],
];
module ldraw_lib__190155c(step=0, col=false, unit=2/5, alt=false, line=0.2, solid=!$preview)
    makepoly(ldraw_lib__190155c(solid), step=step, col=col, unit=unit, alt=alt, line=line, solid=solid);
ldraw_lib__190155c(line=0.2);
